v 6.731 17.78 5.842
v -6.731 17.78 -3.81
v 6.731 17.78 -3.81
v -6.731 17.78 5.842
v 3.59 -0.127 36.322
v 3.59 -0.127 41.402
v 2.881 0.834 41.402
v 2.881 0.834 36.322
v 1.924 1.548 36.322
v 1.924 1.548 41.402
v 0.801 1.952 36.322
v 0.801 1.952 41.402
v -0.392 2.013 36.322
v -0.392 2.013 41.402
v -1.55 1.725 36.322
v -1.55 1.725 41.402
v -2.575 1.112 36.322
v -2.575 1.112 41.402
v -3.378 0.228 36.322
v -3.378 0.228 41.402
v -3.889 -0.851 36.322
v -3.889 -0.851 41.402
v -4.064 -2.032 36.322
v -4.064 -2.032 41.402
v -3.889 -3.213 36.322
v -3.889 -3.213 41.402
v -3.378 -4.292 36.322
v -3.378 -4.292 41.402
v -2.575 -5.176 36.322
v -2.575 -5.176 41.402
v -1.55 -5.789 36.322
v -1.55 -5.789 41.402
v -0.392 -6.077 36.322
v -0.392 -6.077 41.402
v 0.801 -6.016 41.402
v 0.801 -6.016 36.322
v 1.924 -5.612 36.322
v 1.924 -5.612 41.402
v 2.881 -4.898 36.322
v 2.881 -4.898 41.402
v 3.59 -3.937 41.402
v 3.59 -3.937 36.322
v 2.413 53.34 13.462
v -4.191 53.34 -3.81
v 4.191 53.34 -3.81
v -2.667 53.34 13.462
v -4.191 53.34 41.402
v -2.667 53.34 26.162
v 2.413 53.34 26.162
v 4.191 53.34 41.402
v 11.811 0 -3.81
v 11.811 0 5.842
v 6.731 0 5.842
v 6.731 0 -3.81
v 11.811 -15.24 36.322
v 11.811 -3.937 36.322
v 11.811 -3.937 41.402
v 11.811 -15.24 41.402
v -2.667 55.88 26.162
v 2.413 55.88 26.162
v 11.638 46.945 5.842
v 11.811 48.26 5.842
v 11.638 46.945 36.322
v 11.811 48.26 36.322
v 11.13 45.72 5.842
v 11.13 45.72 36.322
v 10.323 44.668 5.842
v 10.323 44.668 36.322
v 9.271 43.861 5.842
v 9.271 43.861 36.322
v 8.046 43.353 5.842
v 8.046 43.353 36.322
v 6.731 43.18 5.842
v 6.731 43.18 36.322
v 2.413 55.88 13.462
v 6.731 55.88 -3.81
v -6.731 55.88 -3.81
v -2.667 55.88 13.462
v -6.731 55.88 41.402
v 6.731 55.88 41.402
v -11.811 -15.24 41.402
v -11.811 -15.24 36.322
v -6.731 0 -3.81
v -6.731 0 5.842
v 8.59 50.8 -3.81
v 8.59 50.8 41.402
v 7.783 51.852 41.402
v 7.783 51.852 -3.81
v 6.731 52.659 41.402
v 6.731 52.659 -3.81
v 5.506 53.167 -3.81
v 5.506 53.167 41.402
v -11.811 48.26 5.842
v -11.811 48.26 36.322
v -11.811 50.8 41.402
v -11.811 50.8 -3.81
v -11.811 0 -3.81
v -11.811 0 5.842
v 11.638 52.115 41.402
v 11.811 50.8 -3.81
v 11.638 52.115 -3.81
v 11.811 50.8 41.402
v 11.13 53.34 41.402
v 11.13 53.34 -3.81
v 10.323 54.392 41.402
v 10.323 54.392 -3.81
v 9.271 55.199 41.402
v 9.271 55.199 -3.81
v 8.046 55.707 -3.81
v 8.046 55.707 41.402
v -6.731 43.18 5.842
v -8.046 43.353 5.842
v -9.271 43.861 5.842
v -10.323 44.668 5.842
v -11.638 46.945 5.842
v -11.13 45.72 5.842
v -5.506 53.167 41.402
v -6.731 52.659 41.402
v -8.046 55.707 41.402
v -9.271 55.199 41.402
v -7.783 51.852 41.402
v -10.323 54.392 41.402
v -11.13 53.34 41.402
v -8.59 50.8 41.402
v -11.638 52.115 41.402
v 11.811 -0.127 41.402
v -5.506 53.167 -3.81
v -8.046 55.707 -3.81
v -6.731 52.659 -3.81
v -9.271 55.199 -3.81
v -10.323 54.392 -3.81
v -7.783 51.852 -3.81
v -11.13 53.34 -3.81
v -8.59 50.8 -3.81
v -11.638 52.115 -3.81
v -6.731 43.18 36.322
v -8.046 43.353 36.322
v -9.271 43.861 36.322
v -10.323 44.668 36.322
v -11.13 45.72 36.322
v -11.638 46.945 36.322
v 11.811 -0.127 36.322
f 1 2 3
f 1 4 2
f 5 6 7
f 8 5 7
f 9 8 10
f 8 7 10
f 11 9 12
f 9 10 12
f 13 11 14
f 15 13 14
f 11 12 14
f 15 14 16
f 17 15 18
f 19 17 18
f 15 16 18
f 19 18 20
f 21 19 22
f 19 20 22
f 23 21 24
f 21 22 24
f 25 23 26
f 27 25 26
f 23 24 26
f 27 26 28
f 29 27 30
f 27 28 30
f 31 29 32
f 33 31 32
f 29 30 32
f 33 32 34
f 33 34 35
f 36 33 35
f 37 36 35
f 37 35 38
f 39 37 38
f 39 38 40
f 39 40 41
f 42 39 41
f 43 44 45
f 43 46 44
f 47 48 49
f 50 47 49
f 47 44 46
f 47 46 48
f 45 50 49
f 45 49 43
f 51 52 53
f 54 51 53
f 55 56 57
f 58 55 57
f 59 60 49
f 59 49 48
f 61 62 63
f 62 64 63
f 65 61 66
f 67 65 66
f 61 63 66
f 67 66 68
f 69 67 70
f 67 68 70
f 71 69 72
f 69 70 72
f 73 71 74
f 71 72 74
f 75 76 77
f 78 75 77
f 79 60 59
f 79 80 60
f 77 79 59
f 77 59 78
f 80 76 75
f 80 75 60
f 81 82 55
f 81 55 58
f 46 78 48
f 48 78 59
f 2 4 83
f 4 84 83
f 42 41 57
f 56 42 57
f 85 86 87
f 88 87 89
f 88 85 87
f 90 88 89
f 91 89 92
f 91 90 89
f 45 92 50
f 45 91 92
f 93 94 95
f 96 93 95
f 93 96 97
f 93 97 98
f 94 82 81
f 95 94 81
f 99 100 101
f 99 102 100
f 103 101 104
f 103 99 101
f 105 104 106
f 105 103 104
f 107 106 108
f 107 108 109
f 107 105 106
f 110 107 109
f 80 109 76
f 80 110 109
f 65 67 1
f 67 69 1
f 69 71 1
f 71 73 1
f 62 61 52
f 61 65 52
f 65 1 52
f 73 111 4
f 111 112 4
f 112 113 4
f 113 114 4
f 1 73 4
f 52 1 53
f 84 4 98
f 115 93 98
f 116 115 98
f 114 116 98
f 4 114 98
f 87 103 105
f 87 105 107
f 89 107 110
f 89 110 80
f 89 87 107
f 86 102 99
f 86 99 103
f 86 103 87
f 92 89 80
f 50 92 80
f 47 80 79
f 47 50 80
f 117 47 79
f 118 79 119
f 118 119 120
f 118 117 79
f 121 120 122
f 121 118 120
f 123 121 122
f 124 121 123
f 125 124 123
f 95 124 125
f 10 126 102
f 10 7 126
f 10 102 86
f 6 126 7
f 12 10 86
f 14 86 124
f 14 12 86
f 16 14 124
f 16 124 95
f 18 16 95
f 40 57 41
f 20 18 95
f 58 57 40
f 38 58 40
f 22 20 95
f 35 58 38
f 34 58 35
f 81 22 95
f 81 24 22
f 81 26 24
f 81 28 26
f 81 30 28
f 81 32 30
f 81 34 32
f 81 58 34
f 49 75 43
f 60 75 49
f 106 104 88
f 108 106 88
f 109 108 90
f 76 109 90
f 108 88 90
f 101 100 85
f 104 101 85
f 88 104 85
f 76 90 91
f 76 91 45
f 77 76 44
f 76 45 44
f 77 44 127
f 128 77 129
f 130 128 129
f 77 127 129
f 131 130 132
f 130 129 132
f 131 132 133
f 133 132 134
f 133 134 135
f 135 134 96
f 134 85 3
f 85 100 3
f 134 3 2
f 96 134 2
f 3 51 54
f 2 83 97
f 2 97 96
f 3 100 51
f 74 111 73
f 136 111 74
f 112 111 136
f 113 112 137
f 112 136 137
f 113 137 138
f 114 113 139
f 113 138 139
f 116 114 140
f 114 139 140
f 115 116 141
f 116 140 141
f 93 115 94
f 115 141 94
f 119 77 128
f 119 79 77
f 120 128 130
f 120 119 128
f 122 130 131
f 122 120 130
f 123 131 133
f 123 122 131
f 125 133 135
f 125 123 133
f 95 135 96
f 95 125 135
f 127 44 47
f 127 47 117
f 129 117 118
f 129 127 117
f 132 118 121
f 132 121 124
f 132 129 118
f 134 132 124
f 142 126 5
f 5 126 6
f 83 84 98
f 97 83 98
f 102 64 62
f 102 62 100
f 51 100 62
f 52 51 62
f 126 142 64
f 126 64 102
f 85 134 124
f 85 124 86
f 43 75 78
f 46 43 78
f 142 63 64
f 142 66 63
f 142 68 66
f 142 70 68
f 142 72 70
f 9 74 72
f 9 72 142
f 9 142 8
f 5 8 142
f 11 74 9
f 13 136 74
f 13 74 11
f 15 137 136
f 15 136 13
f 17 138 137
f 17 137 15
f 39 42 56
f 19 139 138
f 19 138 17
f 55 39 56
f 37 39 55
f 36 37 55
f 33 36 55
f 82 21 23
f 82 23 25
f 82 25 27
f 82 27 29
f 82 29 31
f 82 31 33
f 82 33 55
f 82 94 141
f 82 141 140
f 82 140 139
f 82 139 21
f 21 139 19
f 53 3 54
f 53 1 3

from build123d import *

# Parameters (mm, degrees)
F1_DEPTH  = 5.842
F2_DEPTH  = 5.08
F3_W      = 18.542
F3_H      = 5.08
F4_DEPTH  = 35.56
F5_W      = 18.542
F5_H      = 5.08
F6_DEPTH  = 58.42
F8_DEPTH  = 2.54
F9_DEPTH  = 2.54
F7_W      = 19.7188566824
F7_H      = 3.81
F10_DEPTH = 25.4
F11_DEPTH = 3.81
F12_DEPTH = 5.08
F13_DEPTH = 7.62
F14_W     = 18.542
F14_H     = 5.08
F15_DEPTH = 127
F16_R     = 5.07999
F18_DEPTH = 2.54
F19_W     = 5.08
F19_H     = 12.7
F20_DEPTH = 5.08


# Not quite as in the source:
# - two fillets or chamfers of one size are made in one step
# - a fillet or chamfer is up to 0.001 mm smaller than in the source, because OpenCascade refuses the exact size


with BuildPart() as f1:
    # F0 (on Top) → F1 (new body)
    with BuildSketch(Plane.XY):
        Polygon((-9.271, 43.18), (-9.271, 0), (-6.731, 0), (-6.731, 12.7), (6.731, 12.7), (6.731, 0), (9.271, 0), (9.271, 43.18), align=None)
    extrude(amount=F1_DEPTH)

    # F2 (add): a face of the model
    f2_faces = [f1.faces().sort_by_distance(p)[0] for p in [
        (0, 43.18, 2.921),
    ]]
    extrude(f2_faces, amount=F2_DEPTH)

    # F3 (on face) → F4 (join)
    with BuildSketch(Plane.XY.offset(5.842)):
        with Locations((0, 45.72)):
            Rectangle(F3_W, F3_H)
    extrude(amount=F4_DEPTH)

    # F5 (on face) → F6 (join)
    with BuildSketch(Plane.XZ.offset(-43.18)):
        with Locations((0, 38.862)):
            Rectangle(F5_W, F5_H)
    extrude(amount=F6_DEPTH)

    # F8 (add): a face of the model
    f8_faces = [f1.faces().sort_by_distance(p)[0] for p in [
        (-9.271, 0.7580485211, 2.921),
    ]]
    extrude(f8_faces, amount=F8_DEPTH)

    # F9 (add): a face of the model
    f9_faces = [f1.faces().sort_by_distance(p)[0] for p in [
        (9.271, 0.7580485211, 2.921),
    ]]
    extrude(f9_faces, amount=F9_DEPTH)

    # F7 (on face) → F10 (cut)
    with BuildSketch(Plane.XY.offset(41.402)):
        with BuildLine():
            ThreePointArc((3.5898566824, -0.127), (3.9436831489, -1.0504404137), (4.064, -2.032))
            ThreePointArc((4.064, -2.032), (3.9436831489, -3.0135595863), (3.5898566824, -3.937))
            Line((3.5898566824, -3.937), (9.271, -3.937))
            Line((9.271, -3.937), (9.271, -0.127))
            Line((9.271, -0.127), (3.5898566824, -0.127))
        make_face()
        with BuildLine():
            Line((3.5898566824, -3.937), (3.5898566824, -0.127))
            ThreePointArc((3.5898566824, -0.127), (-4.064, -2.032), (3.5898566824, -3.937))
        make_face()
        with BuildLine():
            ThreePointArc((3.5898566824, -3.937), (3.9436831489, -3.0135595863), (4.064, -2.032))
            ThreePointArc((4.064, -2.032), (3.9436831489, -1.0504404137), (3.5898566824, -0.127))
            Line((3.5898566824, -0.127), (3.5898566824, -3.937))
        make_face()
        with Locations((19.1304283412, -2.032)):
            Rectangle(F7_W, F7_H)
    extrude(amount=-F10_DEPTH, mode=Mode.SUBTRACT)

    # F11 (add): a face of the model
    f11_faces = [f1.faces().sort_by_distance(p)[0] for p in [
        (0, 27.2669507324, 0),
    ]]
    extrude(f11_faces, amount=F11_DEPTH)

    # F12 (cut): a face of the model
    f12_faces = [f1.faces().sort_by_distance(p)[0] for p in [
        (0, 12.7, 1.016),
    ]]
    extrude(f12_faces, amount=-F12_DEPTH, mode=Mode.SUBTRACT)

    # F13 (add): a face of the model
    f13_faces = [f1.faces().sort_by_distance(p)[0] for p in [
        (0, 48.26, 18.796),
    ]]
    extrude(f13_faces, amount=F13_DEPTH)

    # F14 (on face) → F15 (cut)
    with BuildSketch(Plane.XY.offset(41.402)):
        with Locations((0, 50.8)):
            Rectangle(F14_W, F14_H)
    extrude(amount=-F15_DEPTH, mode=Mode.SUBTRACT)

    # F16 (radius 5.08 in the source; OpenCascade refuses exactly that, so slightly less here)
    f16_edges = [f1.edges().sort_by_distance(p)[0] for p in [
        (9.271, 53.34, 18.796),
        (-9.271, 53.34, 18.796),
        (-11.811, 55.88, 18.796),
        (-11.811, 43.18, 21.082),
        (11.811, 43.18, 21.082),
        (11.811, 55.88, 18.796),
    ]]
    fillet(f16_edges, radius=F16_R)

    # F18 (add): a face of the model
    f18_faces = [f1.faces().sort_by_distance(p)[0] for p in [
        (0, 48.26, 18.796),
    ]]
    extrude(f18_faces, amount=F18_DEPTH)

    # F19 (on face) → F20 (cut)
    with BuildSketch(Plane(origin=(0, 55.88, 0), x_dir=(-1, 0, 0), z_dir=(0, 1, 0))):
        with Locations((0.127, 19.812)):
            Rectangle(F19_W, F19_H)
    extrude(amount=-F20_DEPTH, mode=Mode.SUBTRACT)


solid = f1.part
